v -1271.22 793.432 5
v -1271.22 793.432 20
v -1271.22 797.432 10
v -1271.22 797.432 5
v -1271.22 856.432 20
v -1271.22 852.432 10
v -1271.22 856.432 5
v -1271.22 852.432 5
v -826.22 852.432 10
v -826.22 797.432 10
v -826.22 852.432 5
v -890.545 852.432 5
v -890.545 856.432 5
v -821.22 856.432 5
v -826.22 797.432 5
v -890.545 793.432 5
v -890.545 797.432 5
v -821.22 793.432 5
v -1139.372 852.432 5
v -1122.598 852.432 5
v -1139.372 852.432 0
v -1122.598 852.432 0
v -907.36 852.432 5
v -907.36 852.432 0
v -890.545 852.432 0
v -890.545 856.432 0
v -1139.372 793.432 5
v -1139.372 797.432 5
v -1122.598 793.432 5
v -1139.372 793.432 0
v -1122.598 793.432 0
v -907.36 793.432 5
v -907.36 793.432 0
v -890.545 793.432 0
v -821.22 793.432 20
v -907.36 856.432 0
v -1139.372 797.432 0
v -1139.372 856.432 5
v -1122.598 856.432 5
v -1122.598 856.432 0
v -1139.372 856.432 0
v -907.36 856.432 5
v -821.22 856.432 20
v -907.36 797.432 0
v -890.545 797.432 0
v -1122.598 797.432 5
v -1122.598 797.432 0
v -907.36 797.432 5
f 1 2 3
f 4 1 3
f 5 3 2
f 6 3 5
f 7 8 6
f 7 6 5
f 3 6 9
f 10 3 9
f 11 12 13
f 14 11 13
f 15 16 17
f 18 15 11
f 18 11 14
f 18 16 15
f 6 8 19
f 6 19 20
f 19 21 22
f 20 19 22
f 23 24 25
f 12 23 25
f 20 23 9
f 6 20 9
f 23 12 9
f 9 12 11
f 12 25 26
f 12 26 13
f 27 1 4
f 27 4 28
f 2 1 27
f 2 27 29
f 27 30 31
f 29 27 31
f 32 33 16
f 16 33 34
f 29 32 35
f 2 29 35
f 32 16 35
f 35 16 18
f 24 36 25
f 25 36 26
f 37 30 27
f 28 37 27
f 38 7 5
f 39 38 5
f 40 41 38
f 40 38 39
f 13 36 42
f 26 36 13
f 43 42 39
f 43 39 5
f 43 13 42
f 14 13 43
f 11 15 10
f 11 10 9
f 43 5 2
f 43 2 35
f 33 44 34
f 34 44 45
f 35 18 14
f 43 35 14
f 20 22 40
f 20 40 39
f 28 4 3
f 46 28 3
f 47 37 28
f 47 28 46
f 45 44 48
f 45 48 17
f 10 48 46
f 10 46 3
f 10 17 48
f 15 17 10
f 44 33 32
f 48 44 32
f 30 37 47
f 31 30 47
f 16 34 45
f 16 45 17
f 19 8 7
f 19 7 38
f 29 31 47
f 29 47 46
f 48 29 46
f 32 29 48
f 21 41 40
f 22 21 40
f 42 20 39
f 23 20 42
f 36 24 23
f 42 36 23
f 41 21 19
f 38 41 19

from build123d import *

# Parameters (mm, degrees)
SKETCH_1_W          = 450
SKETCH_1_H          = 63
EXTRUDE_1_DEPTH     = 20
CUT_EXTRUDE_START   = -20
SKETCH_2_W          = 445
SKETCH_2_H          = 55
CUT_EXTRUDE_1_DEPTH = 10
SKETCH_3_W          = 131.848612651
SKETCH_3_H          = 5
SKETCH_3_W_2        = 215.237788284
SKETCH_3_W_3        = 69.324505159
CUT_EXTRUDE_2_DEPTH = 64


with BuildPart() as part:
    # 草图1 → 凸台-拉伸1 (new body)
    with BuildSketch(Plane.XY):
        with Locations((-1046.220159151, 824.932360743)):
            Rectangle(SKETCH_1_W, SKETCH_1_H)
    extrude(amount=EXTRUDE_1_DEPTH)

    # 草图2 → 切除-拉伸1 (cut)
    with BuildSketch(Plane.XY.offset(20).offset(CUT_EXTRUDE_START)):
        with Locations((-1048.720159151, 824.932360743)):
            Rectangle(SKETCH_2_W, SKETCH_2_H)
    extrude(amount=CUT_EXTRUDE_1_DEPTH, mode=Mode.SUBTRACT)

    # 草图3 → 切除-拉伸2 (cut, through all)
    with BuildSketch(Plane.XZ.offset(-793.432360743)):
        with Locations((-1205.295852826, 2.5)):
            Rectangle(SKETCH_3_W, SKETCH_3_H)
        with Locations((-1014.979168507, 2.5)):
            Rectangle(SKETCH_3_W_2, SKETCH_3_H)
        with Locations((-855.882411731, 2.5)):
            Rectangle(SKETCH_3_W_3, SKETCH_3_H)
    extrude(amount=-CUT_EXTRUDE_2_DEPTH, mode=Mode.SUBTRACT)


solid = part.part
